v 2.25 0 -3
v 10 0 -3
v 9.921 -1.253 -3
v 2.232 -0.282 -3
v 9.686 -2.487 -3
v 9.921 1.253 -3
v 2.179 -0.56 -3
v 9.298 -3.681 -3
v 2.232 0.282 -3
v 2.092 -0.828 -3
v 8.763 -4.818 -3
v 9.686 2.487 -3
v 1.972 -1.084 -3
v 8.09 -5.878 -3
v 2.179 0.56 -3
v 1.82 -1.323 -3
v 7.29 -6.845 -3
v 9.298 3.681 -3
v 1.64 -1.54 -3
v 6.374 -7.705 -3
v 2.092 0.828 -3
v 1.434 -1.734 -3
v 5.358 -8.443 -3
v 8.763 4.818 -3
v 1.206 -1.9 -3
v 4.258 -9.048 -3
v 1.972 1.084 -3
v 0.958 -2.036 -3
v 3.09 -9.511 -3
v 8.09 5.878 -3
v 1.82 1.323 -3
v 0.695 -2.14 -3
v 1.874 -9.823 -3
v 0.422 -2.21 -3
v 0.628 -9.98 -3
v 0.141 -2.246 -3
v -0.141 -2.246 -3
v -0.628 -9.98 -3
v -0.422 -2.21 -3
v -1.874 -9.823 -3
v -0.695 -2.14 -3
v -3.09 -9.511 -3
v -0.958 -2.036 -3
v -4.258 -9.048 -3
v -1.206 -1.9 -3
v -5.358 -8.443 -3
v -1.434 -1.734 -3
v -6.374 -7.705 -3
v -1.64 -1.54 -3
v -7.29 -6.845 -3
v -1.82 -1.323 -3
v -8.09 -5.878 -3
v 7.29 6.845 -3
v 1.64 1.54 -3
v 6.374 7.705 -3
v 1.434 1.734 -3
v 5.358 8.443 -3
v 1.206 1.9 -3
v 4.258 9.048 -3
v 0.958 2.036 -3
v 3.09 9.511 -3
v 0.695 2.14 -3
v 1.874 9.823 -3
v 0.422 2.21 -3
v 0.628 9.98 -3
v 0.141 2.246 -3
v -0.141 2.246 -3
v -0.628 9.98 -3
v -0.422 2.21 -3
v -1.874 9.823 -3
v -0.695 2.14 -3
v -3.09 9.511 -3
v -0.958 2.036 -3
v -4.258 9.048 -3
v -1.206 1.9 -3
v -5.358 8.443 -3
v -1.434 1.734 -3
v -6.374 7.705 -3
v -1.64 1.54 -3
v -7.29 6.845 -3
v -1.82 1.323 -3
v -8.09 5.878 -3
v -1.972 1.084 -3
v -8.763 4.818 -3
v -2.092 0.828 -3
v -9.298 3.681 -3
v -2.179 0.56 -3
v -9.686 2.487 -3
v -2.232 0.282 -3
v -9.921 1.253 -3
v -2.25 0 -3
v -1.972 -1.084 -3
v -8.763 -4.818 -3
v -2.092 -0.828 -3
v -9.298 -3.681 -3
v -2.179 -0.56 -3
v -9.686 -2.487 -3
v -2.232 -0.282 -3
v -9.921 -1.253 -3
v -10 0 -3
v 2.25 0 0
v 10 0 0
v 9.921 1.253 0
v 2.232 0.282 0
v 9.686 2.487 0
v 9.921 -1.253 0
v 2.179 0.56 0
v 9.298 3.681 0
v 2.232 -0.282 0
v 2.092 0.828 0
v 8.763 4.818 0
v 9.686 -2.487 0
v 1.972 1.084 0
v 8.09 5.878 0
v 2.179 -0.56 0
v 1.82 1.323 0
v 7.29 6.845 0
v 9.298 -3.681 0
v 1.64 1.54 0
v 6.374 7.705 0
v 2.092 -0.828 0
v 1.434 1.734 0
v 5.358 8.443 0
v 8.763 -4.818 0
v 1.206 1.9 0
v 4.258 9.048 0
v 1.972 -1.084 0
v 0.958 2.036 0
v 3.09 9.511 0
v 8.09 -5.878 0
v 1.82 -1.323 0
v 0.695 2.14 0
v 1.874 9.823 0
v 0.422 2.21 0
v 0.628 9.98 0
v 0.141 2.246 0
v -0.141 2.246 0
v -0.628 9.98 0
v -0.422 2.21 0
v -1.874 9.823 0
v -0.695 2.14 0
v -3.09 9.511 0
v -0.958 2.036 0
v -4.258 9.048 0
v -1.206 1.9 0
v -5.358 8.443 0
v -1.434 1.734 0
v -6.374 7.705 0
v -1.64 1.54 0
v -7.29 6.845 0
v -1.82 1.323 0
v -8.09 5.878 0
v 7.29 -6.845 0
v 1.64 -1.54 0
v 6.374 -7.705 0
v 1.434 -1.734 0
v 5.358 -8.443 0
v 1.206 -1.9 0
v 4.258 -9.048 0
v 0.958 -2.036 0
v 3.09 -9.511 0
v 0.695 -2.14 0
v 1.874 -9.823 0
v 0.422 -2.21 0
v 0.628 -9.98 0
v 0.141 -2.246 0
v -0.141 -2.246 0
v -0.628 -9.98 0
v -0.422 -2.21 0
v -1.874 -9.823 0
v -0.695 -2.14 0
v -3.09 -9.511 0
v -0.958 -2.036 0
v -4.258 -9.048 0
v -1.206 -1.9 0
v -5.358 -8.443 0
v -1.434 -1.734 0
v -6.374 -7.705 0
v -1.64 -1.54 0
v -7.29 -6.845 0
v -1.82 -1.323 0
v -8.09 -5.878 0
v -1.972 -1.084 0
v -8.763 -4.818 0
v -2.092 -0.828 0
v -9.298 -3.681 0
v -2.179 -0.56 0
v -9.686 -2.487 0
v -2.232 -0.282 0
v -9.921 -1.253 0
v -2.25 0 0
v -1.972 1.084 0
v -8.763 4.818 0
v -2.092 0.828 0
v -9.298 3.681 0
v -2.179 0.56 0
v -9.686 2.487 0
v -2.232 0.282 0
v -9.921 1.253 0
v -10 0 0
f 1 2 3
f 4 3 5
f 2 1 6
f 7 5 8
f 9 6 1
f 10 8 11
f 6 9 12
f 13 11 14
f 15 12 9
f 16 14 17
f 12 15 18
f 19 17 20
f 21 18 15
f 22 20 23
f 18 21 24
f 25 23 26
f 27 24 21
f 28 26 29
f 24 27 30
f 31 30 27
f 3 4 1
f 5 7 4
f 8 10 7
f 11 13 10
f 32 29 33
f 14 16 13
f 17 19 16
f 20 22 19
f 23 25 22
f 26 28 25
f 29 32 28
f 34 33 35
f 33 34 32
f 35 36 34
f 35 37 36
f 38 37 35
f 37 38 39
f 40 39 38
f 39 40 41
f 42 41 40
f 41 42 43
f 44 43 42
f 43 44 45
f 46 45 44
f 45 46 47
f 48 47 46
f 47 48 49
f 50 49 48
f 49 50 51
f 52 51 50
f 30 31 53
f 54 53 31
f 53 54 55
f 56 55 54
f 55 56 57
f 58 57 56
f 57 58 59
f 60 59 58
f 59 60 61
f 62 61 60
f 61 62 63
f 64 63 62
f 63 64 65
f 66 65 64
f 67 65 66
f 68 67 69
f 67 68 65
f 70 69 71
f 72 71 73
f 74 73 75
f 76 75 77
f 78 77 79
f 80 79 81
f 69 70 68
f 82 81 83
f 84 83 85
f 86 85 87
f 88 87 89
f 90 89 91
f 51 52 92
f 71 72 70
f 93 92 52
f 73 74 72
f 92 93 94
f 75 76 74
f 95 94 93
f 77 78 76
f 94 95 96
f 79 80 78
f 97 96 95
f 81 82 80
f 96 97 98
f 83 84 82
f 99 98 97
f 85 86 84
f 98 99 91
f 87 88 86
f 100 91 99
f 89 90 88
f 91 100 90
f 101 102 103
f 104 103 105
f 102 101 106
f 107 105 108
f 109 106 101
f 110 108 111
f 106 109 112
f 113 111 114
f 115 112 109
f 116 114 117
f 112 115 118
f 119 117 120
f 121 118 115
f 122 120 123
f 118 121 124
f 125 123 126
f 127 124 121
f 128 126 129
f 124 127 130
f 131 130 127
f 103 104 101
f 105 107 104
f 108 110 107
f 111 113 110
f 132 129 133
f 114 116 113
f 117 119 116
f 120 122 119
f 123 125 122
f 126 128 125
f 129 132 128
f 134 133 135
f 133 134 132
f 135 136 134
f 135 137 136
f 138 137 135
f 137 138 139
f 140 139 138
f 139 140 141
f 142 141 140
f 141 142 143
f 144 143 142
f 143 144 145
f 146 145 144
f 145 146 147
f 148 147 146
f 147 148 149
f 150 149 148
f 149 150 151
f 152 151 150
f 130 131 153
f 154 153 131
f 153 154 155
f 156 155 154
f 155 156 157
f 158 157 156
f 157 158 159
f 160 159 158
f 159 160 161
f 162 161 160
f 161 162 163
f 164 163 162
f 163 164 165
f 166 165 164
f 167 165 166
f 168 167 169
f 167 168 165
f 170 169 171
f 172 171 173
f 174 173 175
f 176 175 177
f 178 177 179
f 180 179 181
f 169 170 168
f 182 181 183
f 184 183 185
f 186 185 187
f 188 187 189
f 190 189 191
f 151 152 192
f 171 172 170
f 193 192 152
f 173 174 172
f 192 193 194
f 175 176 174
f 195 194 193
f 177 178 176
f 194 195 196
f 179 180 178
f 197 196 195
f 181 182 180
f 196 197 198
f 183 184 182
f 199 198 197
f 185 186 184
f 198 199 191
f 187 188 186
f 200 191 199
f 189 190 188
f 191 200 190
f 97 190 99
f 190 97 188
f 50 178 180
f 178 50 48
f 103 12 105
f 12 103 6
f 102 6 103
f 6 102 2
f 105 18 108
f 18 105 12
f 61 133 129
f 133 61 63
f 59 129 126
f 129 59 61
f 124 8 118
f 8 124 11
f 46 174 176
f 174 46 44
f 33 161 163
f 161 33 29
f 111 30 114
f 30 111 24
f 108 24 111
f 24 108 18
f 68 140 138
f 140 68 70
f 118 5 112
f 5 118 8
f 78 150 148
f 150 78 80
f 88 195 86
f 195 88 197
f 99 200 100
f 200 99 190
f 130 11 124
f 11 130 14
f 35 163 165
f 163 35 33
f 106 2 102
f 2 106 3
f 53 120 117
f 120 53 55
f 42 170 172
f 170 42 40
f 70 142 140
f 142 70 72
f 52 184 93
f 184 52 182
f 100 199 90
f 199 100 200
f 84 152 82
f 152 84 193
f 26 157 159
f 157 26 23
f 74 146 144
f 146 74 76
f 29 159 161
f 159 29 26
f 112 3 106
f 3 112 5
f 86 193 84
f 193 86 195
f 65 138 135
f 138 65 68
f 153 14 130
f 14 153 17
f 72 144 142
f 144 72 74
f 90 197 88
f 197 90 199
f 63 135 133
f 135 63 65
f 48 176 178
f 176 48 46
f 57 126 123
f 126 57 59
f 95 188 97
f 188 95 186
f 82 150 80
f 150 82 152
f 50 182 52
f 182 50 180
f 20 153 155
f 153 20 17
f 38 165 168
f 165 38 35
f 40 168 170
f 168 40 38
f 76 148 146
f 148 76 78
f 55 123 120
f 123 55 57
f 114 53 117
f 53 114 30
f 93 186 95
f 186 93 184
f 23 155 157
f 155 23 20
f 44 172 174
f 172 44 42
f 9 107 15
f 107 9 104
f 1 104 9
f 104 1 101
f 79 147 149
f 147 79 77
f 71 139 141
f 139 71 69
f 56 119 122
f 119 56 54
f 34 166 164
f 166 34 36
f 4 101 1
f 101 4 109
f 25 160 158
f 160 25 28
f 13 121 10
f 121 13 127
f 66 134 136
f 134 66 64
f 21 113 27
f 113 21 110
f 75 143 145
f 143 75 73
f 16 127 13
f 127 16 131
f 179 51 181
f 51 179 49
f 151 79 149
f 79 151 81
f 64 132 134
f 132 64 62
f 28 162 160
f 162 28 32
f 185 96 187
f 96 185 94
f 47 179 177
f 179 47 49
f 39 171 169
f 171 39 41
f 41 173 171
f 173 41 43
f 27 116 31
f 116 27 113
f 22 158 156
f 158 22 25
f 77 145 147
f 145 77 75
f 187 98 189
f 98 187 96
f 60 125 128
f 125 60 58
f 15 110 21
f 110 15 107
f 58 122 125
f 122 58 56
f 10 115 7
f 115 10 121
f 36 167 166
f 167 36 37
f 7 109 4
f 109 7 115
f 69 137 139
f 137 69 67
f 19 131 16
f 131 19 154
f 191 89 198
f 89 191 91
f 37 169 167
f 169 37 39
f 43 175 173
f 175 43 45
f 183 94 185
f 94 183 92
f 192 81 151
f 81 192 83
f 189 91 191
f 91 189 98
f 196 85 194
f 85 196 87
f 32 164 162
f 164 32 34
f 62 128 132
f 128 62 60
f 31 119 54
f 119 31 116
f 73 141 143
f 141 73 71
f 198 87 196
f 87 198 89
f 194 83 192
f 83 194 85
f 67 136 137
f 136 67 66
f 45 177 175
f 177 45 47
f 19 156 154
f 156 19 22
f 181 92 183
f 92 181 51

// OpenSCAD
$fn = 50;


difference() {
	union() {
		translate(v = [0, 0, -3.0000000000]) {
			cylinder(h = 3, r = 7.0000000000);
		}
		translate(v = [0, 0, -3.0000000000]) {
			cylinder(h = 3, r = 10.0000000000);
		}
	}
	union() {
		#translate(v = [0, 0, -3]) {
			cylinder(h = 3, r = 2.2500000000);
		}
	}
}
